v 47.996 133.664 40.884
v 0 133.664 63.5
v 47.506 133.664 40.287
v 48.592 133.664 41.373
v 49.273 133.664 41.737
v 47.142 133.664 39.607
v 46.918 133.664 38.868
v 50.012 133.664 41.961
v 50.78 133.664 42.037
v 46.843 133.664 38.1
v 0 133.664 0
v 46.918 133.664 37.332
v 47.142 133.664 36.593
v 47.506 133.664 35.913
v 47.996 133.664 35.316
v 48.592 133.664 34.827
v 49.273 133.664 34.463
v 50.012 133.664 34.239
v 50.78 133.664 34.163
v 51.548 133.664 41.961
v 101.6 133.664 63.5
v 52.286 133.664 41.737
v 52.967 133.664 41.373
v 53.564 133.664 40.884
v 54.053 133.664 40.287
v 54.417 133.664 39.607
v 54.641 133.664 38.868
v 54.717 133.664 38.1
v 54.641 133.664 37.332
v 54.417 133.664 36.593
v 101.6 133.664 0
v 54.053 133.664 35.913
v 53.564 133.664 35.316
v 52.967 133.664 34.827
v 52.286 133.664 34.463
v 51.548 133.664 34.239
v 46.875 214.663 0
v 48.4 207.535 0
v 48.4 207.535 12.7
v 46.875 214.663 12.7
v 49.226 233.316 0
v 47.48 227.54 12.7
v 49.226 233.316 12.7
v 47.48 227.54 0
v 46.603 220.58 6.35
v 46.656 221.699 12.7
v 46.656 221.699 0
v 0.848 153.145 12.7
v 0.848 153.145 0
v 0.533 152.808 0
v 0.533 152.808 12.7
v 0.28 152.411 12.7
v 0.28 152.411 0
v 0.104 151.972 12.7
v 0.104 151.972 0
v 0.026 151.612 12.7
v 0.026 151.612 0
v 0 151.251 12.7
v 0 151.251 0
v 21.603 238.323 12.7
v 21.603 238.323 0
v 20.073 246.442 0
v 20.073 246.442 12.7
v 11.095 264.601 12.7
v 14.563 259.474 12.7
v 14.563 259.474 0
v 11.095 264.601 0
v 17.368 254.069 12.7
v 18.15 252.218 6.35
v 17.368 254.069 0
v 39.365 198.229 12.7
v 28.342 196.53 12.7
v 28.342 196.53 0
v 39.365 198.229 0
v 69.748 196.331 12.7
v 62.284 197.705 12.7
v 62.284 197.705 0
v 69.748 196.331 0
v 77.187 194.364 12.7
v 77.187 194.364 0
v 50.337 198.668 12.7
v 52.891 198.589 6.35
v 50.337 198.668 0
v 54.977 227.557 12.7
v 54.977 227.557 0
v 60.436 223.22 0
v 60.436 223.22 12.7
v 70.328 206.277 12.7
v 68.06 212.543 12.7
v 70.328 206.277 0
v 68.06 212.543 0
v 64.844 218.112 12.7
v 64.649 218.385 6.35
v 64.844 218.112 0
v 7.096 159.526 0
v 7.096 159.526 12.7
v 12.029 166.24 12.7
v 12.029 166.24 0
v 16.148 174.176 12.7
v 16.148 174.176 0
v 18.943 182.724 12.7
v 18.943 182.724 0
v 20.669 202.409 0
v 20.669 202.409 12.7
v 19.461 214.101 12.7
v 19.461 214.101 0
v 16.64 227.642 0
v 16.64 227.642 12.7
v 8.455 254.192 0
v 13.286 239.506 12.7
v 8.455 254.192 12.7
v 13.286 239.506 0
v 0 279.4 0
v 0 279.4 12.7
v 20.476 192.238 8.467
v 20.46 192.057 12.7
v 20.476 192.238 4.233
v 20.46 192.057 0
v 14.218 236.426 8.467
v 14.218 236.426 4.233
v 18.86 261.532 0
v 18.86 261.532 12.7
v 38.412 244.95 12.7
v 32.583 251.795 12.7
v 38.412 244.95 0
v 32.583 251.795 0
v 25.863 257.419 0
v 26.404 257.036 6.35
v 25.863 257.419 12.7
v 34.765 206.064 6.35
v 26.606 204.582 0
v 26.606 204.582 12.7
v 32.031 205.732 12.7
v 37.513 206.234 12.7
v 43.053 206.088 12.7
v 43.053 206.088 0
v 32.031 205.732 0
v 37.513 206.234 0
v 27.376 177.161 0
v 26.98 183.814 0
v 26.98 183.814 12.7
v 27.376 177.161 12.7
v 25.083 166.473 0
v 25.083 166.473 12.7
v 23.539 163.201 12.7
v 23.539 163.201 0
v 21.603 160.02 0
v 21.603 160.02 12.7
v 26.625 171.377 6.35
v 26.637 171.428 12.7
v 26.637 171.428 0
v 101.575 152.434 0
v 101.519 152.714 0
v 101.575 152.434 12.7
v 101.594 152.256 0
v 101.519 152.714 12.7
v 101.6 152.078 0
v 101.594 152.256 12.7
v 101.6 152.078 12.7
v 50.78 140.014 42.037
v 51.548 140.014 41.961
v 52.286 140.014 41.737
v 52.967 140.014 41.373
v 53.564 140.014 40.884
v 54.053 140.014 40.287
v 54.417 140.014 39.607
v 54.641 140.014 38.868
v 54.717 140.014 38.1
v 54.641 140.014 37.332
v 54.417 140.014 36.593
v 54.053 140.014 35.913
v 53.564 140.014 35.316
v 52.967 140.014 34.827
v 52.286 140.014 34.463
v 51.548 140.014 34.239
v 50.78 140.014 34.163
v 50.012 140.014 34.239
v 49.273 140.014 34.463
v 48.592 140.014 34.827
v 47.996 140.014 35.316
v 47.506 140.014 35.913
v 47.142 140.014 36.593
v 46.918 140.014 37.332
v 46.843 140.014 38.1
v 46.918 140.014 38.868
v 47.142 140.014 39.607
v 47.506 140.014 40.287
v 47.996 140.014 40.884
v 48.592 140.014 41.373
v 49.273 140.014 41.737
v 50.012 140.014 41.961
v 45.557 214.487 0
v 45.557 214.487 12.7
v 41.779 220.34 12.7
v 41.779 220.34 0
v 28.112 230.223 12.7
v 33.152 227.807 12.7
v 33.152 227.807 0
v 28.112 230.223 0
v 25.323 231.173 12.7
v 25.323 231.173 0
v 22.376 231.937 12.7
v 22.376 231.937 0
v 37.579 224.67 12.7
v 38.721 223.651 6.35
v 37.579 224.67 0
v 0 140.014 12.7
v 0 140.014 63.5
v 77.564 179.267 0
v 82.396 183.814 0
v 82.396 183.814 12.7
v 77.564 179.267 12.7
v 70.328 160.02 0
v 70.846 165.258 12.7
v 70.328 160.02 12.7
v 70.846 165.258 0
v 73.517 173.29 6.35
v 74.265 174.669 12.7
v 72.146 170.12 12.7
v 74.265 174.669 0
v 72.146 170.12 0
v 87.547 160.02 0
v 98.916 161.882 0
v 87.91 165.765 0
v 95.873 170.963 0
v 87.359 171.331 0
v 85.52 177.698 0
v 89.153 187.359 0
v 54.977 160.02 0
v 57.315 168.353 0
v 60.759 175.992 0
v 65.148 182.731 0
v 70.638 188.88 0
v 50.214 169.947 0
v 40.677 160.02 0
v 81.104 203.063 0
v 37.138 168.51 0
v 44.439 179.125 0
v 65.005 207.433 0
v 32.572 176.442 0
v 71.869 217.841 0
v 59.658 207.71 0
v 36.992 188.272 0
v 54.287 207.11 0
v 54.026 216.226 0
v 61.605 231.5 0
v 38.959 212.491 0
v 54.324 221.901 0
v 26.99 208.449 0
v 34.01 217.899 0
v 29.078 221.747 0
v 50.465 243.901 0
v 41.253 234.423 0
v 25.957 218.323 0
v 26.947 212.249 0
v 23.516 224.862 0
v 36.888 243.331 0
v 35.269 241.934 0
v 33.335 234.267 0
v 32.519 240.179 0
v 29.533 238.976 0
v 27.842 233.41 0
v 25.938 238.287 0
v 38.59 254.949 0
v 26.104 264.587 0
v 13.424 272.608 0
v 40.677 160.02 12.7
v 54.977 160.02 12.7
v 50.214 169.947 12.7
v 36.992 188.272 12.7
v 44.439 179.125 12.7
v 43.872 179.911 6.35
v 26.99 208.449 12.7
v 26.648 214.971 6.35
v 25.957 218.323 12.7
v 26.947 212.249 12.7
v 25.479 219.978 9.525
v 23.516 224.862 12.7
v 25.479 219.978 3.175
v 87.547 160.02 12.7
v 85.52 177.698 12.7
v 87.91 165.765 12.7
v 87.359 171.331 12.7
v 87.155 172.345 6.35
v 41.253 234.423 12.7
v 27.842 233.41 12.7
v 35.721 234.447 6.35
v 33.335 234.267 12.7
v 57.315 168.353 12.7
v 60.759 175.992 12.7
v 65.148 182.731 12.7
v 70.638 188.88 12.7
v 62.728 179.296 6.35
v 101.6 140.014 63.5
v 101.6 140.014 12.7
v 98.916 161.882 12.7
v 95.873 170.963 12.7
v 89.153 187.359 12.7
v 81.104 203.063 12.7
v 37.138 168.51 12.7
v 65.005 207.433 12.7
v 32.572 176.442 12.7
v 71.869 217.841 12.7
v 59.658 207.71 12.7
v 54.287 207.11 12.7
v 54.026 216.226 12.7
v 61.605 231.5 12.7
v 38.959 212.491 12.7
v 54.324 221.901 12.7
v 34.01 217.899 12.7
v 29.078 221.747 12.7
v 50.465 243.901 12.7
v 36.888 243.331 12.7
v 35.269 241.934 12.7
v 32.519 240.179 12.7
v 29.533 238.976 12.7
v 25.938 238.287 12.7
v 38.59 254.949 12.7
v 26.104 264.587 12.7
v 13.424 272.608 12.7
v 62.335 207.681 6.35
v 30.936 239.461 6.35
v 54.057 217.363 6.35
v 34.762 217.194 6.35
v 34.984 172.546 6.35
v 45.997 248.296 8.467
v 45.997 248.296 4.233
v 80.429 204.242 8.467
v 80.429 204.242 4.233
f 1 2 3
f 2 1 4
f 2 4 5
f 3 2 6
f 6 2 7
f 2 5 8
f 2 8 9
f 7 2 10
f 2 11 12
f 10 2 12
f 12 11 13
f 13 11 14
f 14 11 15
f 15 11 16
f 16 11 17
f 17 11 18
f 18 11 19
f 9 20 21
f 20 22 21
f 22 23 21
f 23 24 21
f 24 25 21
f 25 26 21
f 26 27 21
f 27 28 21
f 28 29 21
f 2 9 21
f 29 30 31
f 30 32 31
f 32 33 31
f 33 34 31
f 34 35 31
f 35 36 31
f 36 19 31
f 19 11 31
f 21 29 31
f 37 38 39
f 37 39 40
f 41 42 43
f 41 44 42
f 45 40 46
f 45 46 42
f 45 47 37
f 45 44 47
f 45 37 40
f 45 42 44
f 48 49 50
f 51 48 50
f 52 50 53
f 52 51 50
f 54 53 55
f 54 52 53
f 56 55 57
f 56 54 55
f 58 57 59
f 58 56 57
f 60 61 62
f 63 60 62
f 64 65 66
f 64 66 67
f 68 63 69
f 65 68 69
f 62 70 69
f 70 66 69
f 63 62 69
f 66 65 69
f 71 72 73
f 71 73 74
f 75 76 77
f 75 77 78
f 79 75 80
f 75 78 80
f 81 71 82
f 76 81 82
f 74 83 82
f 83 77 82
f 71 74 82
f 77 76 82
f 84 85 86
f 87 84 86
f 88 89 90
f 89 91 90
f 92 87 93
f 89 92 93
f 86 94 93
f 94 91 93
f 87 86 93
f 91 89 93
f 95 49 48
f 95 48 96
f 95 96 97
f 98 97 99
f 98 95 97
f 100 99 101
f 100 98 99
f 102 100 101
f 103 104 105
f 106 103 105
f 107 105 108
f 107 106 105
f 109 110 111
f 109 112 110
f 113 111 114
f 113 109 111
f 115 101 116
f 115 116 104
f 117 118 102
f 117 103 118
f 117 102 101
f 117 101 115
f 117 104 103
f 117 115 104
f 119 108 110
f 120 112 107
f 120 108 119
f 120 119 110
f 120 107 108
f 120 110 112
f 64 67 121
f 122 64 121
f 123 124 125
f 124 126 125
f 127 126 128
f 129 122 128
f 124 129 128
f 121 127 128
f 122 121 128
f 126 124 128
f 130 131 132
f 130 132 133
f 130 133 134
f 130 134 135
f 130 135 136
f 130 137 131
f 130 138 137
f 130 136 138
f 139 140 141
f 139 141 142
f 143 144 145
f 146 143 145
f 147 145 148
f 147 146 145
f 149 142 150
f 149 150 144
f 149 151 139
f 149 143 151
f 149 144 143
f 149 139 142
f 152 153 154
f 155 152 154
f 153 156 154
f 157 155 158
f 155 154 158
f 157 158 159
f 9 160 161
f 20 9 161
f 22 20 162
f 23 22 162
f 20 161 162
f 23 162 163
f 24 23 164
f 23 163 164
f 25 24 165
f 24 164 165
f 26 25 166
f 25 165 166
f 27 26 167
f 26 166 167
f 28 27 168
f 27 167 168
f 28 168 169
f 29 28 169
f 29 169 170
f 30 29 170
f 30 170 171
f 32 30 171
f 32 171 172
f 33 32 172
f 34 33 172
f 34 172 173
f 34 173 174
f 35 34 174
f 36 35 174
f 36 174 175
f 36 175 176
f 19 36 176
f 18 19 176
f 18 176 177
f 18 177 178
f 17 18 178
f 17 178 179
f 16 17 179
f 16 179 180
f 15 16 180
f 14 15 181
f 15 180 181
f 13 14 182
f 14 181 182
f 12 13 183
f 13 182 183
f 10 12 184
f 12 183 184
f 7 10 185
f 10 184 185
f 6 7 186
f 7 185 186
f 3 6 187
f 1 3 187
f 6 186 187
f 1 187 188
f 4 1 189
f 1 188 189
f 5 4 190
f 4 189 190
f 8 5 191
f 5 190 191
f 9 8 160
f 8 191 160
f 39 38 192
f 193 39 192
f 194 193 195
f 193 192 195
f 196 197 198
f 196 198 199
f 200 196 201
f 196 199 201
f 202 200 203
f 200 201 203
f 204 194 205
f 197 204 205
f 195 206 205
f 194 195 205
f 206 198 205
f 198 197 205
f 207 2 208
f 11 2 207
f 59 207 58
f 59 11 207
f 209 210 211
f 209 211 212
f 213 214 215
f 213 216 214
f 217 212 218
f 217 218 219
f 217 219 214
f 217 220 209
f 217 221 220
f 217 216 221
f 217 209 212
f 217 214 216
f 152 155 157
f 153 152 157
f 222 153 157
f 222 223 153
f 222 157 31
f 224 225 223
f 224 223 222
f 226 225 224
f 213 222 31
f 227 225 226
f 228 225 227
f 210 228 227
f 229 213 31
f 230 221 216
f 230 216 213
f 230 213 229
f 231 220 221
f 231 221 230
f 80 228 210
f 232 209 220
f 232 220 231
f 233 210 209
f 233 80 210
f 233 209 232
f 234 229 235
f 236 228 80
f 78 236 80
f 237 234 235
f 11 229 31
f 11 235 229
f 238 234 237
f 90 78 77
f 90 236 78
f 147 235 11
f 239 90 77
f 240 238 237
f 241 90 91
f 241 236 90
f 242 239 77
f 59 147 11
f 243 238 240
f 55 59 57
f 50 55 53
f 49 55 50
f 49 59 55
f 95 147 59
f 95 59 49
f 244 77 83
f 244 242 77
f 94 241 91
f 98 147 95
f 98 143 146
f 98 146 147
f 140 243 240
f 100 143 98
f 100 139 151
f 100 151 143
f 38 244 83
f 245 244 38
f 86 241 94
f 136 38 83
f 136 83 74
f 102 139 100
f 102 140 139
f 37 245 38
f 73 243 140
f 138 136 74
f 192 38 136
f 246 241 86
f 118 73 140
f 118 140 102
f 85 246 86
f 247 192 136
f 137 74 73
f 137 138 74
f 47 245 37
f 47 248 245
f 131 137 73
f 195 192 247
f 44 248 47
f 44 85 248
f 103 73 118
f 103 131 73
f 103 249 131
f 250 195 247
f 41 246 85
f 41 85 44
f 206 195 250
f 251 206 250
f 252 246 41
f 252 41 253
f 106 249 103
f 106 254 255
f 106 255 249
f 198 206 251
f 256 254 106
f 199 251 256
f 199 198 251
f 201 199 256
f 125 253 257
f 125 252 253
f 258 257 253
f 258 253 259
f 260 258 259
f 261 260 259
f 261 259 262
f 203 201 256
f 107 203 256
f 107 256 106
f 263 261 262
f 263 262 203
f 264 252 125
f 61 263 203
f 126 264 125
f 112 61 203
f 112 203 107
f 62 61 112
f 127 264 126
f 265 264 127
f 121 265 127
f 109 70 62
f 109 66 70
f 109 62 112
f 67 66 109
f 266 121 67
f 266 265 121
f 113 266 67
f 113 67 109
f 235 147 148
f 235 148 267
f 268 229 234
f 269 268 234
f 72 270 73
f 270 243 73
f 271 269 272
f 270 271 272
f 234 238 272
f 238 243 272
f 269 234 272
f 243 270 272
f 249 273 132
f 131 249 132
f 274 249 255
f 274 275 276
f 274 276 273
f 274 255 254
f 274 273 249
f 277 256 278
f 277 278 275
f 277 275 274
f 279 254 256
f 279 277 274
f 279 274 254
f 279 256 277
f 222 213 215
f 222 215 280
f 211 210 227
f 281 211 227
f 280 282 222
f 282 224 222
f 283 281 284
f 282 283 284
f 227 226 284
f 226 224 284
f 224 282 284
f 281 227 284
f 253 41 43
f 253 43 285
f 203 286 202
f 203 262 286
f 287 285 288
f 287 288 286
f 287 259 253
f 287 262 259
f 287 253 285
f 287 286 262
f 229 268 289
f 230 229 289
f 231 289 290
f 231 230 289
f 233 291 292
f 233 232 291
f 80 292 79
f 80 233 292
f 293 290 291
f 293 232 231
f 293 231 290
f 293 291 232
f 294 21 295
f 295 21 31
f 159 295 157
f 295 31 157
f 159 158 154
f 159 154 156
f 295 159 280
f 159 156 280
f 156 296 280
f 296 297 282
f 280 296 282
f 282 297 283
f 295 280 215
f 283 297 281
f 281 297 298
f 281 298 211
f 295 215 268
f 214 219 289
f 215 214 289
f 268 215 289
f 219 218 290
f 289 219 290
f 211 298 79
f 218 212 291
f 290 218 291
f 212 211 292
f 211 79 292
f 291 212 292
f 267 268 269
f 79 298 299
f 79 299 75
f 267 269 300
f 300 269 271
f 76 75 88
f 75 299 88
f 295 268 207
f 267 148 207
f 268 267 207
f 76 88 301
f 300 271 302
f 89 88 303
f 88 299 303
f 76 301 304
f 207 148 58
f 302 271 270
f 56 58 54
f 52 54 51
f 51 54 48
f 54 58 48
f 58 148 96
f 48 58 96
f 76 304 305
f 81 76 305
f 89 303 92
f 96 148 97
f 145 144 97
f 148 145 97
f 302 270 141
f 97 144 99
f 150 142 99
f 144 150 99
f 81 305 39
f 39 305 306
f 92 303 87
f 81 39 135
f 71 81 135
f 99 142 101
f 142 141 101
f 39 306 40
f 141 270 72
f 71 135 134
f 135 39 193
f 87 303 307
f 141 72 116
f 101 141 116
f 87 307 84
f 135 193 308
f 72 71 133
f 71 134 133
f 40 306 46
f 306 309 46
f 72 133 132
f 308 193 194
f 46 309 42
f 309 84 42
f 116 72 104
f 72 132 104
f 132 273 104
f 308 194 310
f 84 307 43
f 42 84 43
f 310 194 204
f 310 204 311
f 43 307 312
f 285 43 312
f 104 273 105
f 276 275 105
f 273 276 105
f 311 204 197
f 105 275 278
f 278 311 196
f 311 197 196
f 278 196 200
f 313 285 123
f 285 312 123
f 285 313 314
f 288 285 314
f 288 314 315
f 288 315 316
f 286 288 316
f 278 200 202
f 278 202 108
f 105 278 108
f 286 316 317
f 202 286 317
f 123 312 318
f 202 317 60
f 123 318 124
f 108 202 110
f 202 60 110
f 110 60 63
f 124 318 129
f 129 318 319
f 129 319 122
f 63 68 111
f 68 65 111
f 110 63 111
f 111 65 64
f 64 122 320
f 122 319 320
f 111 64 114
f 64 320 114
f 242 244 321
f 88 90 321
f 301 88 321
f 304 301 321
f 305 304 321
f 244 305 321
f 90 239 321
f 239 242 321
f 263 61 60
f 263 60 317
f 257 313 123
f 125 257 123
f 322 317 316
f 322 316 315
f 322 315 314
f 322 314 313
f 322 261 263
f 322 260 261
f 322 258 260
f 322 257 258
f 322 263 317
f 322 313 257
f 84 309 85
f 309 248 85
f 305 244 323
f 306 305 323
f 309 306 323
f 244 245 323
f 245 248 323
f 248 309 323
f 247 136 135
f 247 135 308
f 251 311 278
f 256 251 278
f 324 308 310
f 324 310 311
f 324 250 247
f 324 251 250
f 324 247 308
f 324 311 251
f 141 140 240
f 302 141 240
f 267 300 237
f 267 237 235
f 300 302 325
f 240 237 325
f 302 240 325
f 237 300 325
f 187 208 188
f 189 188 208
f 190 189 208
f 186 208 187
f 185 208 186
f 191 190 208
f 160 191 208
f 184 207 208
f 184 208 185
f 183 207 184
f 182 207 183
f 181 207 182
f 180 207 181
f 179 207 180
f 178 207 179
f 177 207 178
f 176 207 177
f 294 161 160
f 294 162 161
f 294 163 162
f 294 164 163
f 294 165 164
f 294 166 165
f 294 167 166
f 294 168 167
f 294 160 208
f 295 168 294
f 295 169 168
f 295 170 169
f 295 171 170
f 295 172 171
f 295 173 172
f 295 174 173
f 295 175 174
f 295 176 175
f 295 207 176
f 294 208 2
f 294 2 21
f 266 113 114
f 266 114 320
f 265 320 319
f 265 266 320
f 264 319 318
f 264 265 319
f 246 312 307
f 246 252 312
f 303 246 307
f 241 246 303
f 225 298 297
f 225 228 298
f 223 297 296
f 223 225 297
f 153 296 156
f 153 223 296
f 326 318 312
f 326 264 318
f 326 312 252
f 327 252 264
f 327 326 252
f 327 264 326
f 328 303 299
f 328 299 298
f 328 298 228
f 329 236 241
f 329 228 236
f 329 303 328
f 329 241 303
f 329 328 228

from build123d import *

# Parameters (mm, degrees)
SKETCH1_W           = 101.6
SKETCH1_H           = 152.4
BOSS_EXTRUDE1_DEPTH = 12.7
BOSS_EXTRUDE3_DEPTH = 12.7
FILLET1_R           = 2.54
FILLET2_R           = 5.08
CUT_EXTRUDE2_DEPTH  = 298.570512784
SKETCH8_W           = 101.6
SKETCH8_H           = 6.35
BOSS_EXTRUDE4_DEPTH = 50.8
SKETCH9_R           = 3.937
CUT_EXTRUDE3_DEPTH  = 184.802308472


with BuildPart() as part:
    # Sketch1 → Boss-Extrude1 (new body)
    with BuildSketch(Plane.XY):
        with Locations((50.8, 76.2)):
            Rectangle(SKETCH1_W, SKETCH1_H)
    extrude(amount=BOSS_EXTRUDE1_DEPTH)

    # Sketch2 → Boss-Extrude3 (add)
    with BuildSketch(Plane.XY):
        with BuildLine():
            add(Edge.make_bspline(
                [(0, 152.4), (39.790111277, 186.839065643), (12.30975625, 238.845497073), (0, 279.4)],
                knots=[0, 0, 0, 0, 1, 1, 1, 1], degree=3))
            add(Edge.make_bspline(
                [(0, 279.4), (51.286050257, 256.550041835), (87.836892382, 205.957944637), (101.6, 152.4)],
                knots=[0, 0, 0, 0, 1, 1, 1, 1], degree=3))
            Line((101.6, 152.4), (0, 152.4))
        make_face()
        with BuildLine():
            add(Edge.make_bspline(
                [(49.225838487, 233.315766274), (35.641228944, 236.267866949), (22.375615267, 231.937259722)],
                knots=[0, 0, 0, 1, 1, 1], degree=2))
            add(Edge.make_bspline(
                [(48.400350721, 207.535437601), (42.054170901, 227.566198031), (22.375615267, 231.937259722)],
                knots=[0, 0, 0, 1, 1, 1], degree=2))
            add(Edge.make_bspline(
                [(48.400350721, 207.535437601), (44.393568943, 220.734513873), (49.225838487, 233.315766274)],
                knots=[0, 0, 0, 1, 1, 1], degree=2))
        make_face(mode=Mode.SUBTRACT)
        with BuildLine():
            add(Edge.make_bspline(
                [(43.05348098, 206.08803494), (36.239789994, 218.91266054), (23.516066372, 224.861937296)],
                knots=[0, 0, 0, 1, 1, 1], degree=2))
            add(Edge.make_bspline(
                [(23.516066372, 224.861937296), (28.235295407, 215.21927262), (26.605728117, 204.582177714)],
                knots=[0, 0, 0, 1, 1, 1], degree=2))
            add(Edge.make_bspline(
                [(26.605728117, 204.582177714), (34.700432609, 206.792891754), (43.05348098, 206.08803494)],
                knots=[0, 0, 0, 1, 1, 1], degree=2))
        make_face(mode=Mode.SUBTRACT)
        with BuildLine():
            add(Edge.make_bspline(
                [(82.396089655, 183.81371778), (70.6713649, 174.663598784), (70.32777317, 160.02)],
                knots=[0, 0, 0, 1, 1, 1], degree=2))
            Line((70.32777317, 160.02), (87.546521436, 160.02))
            add(Edge.make_bspline(
                [(82.396089655, 183.81371778), (89.339550367, 172.773814043), (87.546521436, 160.02)],
                knots=[0, 0, 0, 1, 1, 1], degree=2))
        make_face(mode=Mode.SUBTRACT)
        with BuildLine():
            add(Edge.make_bspline(
                [(26.980466376, 183.81374211), (28.958775605, 170.837543608), (21.602944743, 160.02)],
                knots=[0, 0, 0, 1, 1, 1], degree=2))
            Line((21.602944743, 160.02), (40.676641776, 160.02))
            add(Edge.make_bspline(
                [(26.980466376, 183.81374211), (36.13847285, 173.175056715), (40.676641776, 160.02)],
                knots=[0, 0, 0, 1, 1, 1], degree=2))
        make_face(mode=Mode.SUBTRACT)
        with BuildLine():
            add(Edge.make_bspline(
                [(54.97708308, 160.02), (46.08347584, 181.54755316), (28.342136903, 196.529802482)],
                knots=[0, 0, 0, 1, 1, 1], degree=2))
            add(Edge.make_bspline(
                [(28.342136903, 196.529802482), (53.017815002, 201.732288521), (77.187204495, 194.363538628)],
                knots=[0, 0, 0, 1, 1, 1], degree=2))
            add(Edge.make_bspline(
                [(54.97708308, 160.02), (59.374728895, 181.400643158), (77.187204495, 194.363538628)],
                knots=[0, 0, 0, 1, 1, 1], degree=2))
        make_face(mode=Mode.SUBTRACT)
        with BuildLine():
            add(Edge.make_bspline(
                [(70.328259561, 206.277457578), (62.361576962, 208.669014941), (54.287141362, 207.109917469)],
                knots=[0, 0, 0, 1, 1, 1], degree=2))
            add(Edge.make_bspline(
                [(54.287141362, 207.109917469), (53.482096811, 217.391663167), (54.97708308, 227.557269012)],
                knots=[0, 0, 0, 1, 1, 1], degree=2))
            add(Edge.make_bspline(
                [(54.97708308, 227.557269012), (66.645859754, 219.852180834), (70.328259561, 206.277457578)],
                knots=[0, 0, 0, 1, 1, 1], degree=2))
        make_face(mode=Mode.SUBTRACT)
        with BuildLine():
            add(Edge.make_bspline(
                [(21.602944743, 238.323137826), (19.95197567, 252.974545225), (11.094737768, 264.601494061)],
                knots=[0, 0, 0, 1, 1, 1], degree=2))
            add(Edge.make_bspline(
                [(11.094737768, 264.601494061), (28.053835186, 259.295838115), (38.412267282, 244.949944056)],
                knots=[0, 0, 0, 1, 1, 1], degree=2))
            add(Edge.make_bspline(
                [(21.602944743, 238.323137826), (31.864782779, 237.284469605), (38.412267282, 244.949944056)],
                knots=[0, 0, 0, 1, 1, 1], degree=2))
        make_face(mode=Mode.SUBTRACT)
    extrude(amount=BOSS_EXTRUDE3_DEPTH)

    # Fillet1
    fillet1_edges = [part.edges().sort_by_distance(p)[0] for p in [
        (101.6, 152.4, 6.35),
        (0, 152.4, 6.35),
    ]]
    fillet(fillet1_edges, radius=FILLET1_R)

    # Fillet2
    fillet2_edges = [part.edges().sort_by_distance(p)[0] for p in [
        (0, 0, 6.35),
        (101.6, 0, 6.35),
    ]]
    fillet(fillet2_edges, radius=FILLET2_R)

    # Sketch5 → Cut-Extrude2 (cut, through all)
    with BuildSketch(Plane.XY.offset(12.7)):
        with BuildLine():
            Line((101.6, 133.663922723), (101.519048921, 133.663922723))
            Line((101.519048921, 133.663922723), (0, 133.663922723))
            Line((0, 133.663922723), (0, 5.08))
            ThreePointArc((0, 5.08), (1.487897552, 1.487897552), (5.08, 0))
            Line((5.08, 0), (96.52, 0))
            ThreePointArc((96.52, 0), (100.112102448, 1.487897552), (101.6, 5.08))
            Line((101.6, 5.08), (101.6, 133.663922723))
        make_face()
    extrude(amount=-CUT_EXTRUDE2_DEPTH, mode=Mode.SUBTRACT)

    # Sketch8 → Boss-Extrude4 (add)
    with BuildSketch(Plane.XY.offset(12.7)):
        with Locations((50.8, 136.838922723)):
            Rectangle(SKETCH8_W, SKETCH8_H)
    extrude(amount=BOSS_EXTRUDE4_DEPTH)

    # Sketch9 → Cut-Extrude3 (cut, through all)
    with BuildSketch(Plane(origin=(0, 140.013922723, 0), x_dir=(1, 0, 0), z_dir=(0, 1, 0))):
        with Locations(Location((50.77976223, -38.1, 0), (0, 0, 270))):
            Circle(SKETCH9_R)
    extrude(amount=-CUT_EXTRUDE3_DEPTH, mode=Mode.SUBTRACT)


solid = part.part
